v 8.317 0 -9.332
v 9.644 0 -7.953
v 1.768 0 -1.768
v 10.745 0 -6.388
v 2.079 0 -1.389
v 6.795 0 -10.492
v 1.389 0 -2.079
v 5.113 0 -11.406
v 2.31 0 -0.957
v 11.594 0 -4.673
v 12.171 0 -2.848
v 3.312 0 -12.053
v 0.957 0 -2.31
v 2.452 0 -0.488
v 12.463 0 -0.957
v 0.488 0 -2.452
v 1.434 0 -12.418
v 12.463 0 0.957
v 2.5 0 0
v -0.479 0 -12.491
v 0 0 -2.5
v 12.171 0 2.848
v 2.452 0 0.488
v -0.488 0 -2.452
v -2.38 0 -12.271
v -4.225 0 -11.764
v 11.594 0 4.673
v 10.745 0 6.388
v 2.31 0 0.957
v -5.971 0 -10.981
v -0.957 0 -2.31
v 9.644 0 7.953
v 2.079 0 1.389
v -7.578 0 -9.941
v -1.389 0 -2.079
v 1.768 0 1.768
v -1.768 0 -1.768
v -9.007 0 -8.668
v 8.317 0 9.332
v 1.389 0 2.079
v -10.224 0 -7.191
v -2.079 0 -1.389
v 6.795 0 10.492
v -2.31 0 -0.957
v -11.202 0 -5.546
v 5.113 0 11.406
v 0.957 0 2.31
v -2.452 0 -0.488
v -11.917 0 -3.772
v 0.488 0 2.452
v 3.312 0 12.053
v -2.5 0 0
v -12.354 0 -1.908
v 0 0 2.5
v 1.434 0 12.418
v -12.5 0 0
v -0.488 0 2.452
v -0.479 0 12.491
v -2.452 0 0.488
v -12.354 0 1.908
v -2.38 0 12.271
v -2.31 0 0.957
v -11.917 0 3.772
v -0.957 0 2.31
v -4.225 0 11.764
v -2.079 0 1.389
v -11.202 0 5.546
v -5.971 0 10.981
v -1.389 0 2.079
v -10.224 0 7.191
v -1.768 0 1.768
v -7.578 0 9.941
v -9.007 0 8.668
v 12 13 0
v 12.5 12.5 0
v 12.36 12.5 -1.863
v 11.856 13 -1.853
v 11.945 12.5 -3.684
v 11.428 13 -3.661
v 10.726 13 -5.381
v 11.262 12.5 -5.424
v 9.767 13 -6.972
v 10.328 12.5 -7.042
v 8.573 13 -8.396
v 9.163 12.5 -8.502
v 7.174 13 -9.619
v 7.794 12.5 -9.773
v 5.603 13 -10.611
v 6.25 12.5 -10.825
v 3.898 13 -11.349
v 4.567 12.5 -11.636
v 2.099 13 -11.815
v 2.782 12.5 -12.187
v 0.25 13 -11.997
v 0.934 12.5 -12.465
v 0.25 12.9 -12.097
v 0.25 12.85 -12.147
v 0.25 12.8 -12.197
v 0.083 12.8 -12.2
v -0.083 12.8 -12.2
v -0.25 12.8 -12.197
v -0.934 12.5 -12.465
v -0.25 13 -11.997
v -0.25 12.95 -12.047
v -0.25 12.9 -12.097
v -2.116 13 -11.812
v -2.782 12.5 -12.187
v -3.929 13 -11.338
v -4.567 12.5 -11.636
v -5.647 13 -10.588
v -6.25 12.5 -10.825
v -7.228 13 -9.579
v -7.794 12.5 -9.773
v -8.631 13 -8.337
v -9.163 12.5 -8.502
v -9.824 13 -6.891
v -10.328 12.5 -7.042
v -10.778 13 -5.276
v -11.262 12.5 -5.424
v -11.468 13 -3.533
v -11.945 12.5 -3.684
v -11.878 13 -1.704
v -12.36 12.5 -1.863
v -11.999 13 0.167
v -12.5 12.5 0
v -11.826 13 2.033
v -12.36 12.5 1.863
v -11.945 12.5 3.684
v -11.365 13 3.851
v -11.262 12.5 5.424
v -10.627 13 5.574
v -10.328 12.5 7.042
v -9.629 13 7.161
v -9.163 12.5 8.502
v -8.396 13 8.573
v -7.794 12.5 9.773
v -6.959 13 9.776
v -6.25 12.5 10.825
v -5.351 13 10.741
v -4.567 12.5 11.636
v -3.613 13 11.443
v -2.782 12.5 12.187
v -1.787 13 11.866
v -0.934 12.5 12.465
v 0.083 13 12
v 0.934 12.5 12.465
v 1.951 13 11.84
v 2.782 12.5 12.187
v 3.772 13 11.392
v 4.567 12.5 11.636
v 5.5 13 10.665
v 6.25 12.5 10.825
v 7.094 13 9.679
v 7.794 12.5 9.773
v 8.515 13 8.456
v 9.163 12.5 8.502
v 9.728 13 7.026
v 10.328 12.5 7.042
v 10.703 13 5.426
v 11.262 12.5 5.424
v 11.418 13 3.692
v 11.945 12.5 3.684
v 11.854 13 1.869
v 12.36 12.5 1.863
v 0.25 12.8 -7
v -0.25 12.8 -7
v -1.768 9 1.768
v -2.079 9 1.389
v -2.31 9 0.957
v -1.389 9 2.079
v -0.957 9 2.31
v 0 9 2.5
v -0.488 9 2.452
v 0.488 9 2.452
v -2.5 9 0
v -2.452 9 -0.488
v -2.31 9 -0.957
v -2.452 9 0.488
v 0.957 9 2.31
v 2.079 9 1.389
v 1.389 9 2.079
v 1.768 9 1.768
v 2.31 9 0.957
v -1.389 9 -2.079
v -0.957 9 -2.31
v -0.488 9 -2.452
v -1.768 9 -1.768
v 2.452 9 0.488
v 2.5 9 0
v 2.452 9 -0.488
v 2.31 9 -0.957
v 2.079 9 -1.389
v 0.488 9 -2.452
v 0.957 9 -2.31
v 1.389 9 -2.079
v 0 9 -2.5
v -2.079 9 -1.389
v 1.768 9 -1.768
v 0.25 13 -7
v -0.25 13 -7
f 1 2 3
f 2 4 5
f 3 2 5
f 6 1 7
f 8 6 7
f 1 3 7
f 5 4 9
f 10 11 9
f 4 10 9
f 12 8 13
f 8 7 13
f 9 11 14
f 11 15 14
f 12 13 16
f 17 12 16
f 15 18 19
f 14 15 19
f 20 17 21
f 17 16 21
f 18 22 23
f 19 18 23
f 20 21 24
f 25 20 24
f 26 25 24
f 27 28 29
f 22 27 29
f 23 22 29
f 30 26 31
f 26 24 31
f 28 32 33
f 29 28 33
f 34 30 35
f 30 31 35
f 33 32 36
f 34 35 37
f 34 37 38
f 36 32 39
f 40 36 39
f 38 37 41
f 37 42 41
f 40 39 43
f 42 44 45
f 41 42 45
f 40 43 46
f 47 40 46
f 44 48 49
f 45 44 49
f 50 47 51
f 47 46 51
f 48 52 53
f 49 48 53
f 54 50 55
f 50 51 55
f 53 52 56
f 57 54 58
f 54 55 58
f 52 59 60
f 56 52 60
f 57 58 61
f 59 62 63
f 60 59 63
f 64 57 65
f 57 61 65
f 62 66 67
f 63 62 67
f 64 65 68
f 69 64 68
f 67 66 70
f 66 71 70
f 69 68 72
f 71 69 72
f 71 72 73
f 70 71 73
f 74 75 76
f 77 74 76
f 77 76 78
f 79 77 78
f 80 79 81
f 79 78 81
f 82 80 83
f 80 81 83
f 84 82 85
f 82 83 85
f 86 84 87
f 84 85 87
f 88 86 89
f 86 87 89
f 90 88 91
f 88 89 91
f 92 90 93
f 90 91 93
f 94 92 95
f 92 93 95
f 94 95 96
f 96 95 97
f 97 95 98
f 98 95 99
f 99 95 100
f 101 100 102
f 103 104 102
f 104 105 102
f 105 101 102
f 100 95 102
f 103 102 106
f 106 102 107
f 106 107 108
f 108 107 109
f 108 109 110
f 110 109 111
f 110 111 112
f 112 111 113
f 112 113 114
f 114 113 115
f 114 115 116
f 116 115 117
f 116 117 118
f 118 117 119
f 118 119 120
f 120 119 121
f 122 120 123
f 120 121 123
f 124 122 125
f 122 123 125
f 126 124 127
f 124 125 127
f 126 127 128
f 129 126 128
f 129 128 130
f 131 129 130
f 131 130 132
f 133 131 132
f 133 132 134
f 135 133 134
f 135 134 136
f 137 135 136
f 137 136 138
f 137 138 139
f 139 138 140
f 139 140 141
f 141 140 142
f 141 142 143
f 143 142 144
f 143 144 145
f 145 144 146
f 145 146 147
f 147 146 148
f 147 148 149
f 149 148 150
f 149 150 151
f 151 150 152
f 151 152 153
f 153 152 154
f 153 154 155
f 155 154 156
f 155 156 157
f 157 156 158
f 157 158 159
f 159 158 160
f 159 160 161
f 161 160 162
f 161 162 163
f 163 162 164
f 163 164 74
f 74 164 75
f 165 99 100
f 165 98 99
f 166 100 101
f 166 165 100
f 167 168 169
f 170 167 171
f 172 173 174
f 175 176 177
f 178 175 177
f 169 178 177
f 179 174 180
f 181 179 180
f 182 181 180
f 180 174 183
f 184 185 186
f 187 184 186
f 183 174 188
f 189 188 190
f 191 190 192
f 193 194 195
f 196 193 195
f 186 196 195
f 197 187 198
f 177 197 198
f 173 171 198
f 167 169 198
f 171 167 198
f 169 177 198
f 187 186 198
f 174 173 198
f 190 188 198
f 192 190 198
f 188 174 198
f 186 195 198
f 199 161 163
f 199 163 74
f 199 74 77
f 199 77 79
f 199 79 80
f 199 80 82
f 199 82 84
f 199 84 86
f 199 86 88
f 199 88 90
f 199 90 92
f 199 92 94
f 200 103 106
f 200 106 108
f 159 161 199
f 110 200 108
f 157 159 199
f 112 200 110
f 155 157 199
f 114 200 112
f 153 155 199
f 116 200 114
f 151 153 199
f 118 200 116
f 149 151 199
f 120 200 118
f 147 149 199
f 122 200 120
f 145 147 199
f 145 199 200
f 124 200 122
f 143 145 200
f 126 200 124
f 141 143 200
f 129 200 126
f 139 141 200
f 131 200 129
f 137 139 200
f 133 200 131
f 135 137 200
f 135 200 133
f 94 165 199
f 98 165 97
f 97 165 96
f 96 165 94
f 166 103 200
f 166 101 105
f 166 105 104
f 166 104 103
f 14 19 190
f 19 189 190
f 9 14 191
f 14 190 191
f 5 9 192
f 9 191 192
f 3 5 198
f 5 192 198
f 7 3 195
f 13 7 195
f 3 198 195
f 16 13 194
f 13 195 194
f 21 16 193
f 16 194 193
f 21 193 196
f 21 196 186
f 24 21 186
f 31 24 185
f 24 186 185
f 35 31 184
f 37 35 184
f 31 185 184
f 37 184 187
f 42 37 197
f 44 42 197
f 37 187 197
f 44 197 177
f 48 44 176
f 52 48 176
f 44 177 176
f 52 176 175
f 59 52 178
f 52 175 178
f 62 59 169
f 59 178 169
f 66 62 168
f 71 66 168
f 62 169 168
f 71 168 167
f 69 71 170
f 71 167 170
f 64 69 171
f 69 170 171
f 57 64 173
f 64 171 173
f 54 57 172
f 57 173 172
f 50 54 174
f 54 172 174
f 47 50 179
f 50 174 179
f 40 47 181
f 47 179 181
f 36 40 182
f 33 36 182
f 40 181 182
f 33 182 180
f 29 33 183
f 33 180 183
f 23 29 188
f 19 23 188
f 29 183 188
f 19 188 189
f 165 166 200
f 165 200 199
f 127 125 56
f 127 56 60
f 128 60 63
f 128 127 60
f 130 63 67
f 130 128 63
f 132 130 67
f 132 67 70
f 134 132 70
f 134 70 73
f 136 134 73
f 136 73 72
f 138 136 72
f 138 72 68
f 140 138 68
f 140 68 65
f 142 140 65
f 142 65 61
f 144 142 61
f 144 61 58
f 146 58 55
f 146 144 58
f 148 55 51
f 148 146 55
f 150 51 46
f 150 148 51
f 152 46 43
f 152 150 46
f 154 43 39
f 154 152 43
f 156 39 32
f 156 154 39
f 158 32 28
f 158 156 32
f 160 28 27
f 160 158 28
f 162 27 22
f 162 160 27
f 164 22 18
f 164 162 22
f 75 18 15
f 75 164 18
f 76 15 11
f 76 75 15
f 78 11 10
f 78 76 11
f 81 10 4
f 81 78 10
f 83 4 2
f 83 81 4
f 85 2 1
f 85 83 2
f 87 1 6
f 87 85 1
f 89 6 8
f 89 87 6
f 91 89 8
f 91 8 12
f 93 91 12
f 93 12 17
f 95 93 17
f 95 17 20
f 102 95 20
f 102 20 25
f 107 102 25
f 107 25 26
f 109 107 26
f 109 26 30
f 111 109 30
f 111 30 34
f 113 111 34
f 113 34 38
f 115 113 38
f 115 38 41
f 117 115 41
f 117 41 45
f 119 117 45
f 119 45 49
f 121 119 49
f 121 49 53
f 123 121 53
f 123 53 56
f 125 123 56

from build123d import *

# Parameters (mm, degrees)
CROQUIS1_W                        = 12.5
CROQUIS1_H                        = 13
CORTAR_EXTRUIR1_START             = -0.2
CORTAR_EXTRUIR1_DEPTH             = 0.2
DI_METRO_DE_TALADRO_5_0_5_1_D     = 5
DI_METRO_DE_TALADRO_5_0_5_1_DEPTH = 9
CHAFL_N1_SIZE                     = 0.2
CROQUIS5_R                        = 2.5
SALIENTE_EXTRUIR1_DEPTH           = 10


with BuildPart() as part:
    # Croquis1 → Revolución1 (revolve)
    with BuildSketch(Plane(origin=(0, 0, 0), x_dir=(-1, 0, 0), z_dir=(0, 0, -1)), mode=Mode.PRIVATE) as revoluci_n1_sk:
        with Locations((-6.25, 6.5)):
            Rectangle(CROQUIS1_W, CROQUIS1_H)
    revolve(revoluci_n1_sk.sketch.rotate(Axis((0, 0, 0), (0, 1, 0)), 180), axis=Axis((0, 0, 0), (0, 1, 0)))

    # Croquis2 → Cortar-Extruir1 (cut)
    with BuildSketch(Plane(origin=(0, 13, 0), x_dir=(-1, 0, 0), z_dir=(0, 1, 0)).offset(CORTAR_EXTRUIR1_START)):
        with BuildLine():
            Line((0.25, -12.49749975), (0.25, -7))
            Line((0.25, -7), (-0.25, -7))
            Line((-0.25, -7), (-0.25, -12.49749975))
            ThreePointArc((-0.25, -12.49749975), (0, -12.5), (0.25, -12.49749975))
        make_face()
    extrude(amount=CORTAR_EXTRUIR1_DEPTH, mode=Mode.SUBTRACT)

    # Diámetro de taladro Ø5.0 (5)1
    with Locations(Plane(origin=(0, 0, 0), x_dir=(-1, 0, 0), z_dir=(0, -1, 0))):
        with Locations((0, 0)):
            Hole(DI_METRO_DE_TALADRO_5_0_5_1_D / 2, depth=DI_METRO_DE_TALADRO_5_0_5_1_DEPTH)

    # Chaflán1
    chafl_n1_edges = [part.edges().sort_by_distance(p)[0] for p in [
        (8.75, 13, 8.926785536),
    ]]
    chamfer(chafl_n1_edges, length=CHAFL_N1_SIZE)

    # Croquis5 → Saliente-Extruir1 (add)
    with BuildSketch(Plane(origin=(0, 13, 0), x_dir=(-1, 0, 0), z_dir=(0, 1, 0))):
        with BuildLine():
            Line((0.25, -7), (-0.25, -7))
            Line((-0.25, -7), (-0.25, -12.49749975))
            ThreePointArc((-0.25, -12.49749975), (0, 12.5), (0.25, -12.49749975))
            Line((0.25, -12.49749975), (0.25, -7))
        make_face()
        with Locations(Location((0, 0, 0), (0, 0, 270))):
            Circle(CROQUIS5_R, mode=Mode.SUBTRACT)
    extrude(amount=-SALIENTE_EXTRUIR1_DEPTH)

    # Chaflán2: read off the stored shape, not the designer's step
    # Chaflán2 outline → Chaflán2 (revolve, cut)
    with BuildSketch(Plane.XY):
        Polygon((12.5, 13), (12, 13), (12.5, 12.5), align=None)
    revolve(axis=Axis((0, 0, 0), (0, 1, 0)), mode=Mode.SUBTRACT)


solid = part.part
